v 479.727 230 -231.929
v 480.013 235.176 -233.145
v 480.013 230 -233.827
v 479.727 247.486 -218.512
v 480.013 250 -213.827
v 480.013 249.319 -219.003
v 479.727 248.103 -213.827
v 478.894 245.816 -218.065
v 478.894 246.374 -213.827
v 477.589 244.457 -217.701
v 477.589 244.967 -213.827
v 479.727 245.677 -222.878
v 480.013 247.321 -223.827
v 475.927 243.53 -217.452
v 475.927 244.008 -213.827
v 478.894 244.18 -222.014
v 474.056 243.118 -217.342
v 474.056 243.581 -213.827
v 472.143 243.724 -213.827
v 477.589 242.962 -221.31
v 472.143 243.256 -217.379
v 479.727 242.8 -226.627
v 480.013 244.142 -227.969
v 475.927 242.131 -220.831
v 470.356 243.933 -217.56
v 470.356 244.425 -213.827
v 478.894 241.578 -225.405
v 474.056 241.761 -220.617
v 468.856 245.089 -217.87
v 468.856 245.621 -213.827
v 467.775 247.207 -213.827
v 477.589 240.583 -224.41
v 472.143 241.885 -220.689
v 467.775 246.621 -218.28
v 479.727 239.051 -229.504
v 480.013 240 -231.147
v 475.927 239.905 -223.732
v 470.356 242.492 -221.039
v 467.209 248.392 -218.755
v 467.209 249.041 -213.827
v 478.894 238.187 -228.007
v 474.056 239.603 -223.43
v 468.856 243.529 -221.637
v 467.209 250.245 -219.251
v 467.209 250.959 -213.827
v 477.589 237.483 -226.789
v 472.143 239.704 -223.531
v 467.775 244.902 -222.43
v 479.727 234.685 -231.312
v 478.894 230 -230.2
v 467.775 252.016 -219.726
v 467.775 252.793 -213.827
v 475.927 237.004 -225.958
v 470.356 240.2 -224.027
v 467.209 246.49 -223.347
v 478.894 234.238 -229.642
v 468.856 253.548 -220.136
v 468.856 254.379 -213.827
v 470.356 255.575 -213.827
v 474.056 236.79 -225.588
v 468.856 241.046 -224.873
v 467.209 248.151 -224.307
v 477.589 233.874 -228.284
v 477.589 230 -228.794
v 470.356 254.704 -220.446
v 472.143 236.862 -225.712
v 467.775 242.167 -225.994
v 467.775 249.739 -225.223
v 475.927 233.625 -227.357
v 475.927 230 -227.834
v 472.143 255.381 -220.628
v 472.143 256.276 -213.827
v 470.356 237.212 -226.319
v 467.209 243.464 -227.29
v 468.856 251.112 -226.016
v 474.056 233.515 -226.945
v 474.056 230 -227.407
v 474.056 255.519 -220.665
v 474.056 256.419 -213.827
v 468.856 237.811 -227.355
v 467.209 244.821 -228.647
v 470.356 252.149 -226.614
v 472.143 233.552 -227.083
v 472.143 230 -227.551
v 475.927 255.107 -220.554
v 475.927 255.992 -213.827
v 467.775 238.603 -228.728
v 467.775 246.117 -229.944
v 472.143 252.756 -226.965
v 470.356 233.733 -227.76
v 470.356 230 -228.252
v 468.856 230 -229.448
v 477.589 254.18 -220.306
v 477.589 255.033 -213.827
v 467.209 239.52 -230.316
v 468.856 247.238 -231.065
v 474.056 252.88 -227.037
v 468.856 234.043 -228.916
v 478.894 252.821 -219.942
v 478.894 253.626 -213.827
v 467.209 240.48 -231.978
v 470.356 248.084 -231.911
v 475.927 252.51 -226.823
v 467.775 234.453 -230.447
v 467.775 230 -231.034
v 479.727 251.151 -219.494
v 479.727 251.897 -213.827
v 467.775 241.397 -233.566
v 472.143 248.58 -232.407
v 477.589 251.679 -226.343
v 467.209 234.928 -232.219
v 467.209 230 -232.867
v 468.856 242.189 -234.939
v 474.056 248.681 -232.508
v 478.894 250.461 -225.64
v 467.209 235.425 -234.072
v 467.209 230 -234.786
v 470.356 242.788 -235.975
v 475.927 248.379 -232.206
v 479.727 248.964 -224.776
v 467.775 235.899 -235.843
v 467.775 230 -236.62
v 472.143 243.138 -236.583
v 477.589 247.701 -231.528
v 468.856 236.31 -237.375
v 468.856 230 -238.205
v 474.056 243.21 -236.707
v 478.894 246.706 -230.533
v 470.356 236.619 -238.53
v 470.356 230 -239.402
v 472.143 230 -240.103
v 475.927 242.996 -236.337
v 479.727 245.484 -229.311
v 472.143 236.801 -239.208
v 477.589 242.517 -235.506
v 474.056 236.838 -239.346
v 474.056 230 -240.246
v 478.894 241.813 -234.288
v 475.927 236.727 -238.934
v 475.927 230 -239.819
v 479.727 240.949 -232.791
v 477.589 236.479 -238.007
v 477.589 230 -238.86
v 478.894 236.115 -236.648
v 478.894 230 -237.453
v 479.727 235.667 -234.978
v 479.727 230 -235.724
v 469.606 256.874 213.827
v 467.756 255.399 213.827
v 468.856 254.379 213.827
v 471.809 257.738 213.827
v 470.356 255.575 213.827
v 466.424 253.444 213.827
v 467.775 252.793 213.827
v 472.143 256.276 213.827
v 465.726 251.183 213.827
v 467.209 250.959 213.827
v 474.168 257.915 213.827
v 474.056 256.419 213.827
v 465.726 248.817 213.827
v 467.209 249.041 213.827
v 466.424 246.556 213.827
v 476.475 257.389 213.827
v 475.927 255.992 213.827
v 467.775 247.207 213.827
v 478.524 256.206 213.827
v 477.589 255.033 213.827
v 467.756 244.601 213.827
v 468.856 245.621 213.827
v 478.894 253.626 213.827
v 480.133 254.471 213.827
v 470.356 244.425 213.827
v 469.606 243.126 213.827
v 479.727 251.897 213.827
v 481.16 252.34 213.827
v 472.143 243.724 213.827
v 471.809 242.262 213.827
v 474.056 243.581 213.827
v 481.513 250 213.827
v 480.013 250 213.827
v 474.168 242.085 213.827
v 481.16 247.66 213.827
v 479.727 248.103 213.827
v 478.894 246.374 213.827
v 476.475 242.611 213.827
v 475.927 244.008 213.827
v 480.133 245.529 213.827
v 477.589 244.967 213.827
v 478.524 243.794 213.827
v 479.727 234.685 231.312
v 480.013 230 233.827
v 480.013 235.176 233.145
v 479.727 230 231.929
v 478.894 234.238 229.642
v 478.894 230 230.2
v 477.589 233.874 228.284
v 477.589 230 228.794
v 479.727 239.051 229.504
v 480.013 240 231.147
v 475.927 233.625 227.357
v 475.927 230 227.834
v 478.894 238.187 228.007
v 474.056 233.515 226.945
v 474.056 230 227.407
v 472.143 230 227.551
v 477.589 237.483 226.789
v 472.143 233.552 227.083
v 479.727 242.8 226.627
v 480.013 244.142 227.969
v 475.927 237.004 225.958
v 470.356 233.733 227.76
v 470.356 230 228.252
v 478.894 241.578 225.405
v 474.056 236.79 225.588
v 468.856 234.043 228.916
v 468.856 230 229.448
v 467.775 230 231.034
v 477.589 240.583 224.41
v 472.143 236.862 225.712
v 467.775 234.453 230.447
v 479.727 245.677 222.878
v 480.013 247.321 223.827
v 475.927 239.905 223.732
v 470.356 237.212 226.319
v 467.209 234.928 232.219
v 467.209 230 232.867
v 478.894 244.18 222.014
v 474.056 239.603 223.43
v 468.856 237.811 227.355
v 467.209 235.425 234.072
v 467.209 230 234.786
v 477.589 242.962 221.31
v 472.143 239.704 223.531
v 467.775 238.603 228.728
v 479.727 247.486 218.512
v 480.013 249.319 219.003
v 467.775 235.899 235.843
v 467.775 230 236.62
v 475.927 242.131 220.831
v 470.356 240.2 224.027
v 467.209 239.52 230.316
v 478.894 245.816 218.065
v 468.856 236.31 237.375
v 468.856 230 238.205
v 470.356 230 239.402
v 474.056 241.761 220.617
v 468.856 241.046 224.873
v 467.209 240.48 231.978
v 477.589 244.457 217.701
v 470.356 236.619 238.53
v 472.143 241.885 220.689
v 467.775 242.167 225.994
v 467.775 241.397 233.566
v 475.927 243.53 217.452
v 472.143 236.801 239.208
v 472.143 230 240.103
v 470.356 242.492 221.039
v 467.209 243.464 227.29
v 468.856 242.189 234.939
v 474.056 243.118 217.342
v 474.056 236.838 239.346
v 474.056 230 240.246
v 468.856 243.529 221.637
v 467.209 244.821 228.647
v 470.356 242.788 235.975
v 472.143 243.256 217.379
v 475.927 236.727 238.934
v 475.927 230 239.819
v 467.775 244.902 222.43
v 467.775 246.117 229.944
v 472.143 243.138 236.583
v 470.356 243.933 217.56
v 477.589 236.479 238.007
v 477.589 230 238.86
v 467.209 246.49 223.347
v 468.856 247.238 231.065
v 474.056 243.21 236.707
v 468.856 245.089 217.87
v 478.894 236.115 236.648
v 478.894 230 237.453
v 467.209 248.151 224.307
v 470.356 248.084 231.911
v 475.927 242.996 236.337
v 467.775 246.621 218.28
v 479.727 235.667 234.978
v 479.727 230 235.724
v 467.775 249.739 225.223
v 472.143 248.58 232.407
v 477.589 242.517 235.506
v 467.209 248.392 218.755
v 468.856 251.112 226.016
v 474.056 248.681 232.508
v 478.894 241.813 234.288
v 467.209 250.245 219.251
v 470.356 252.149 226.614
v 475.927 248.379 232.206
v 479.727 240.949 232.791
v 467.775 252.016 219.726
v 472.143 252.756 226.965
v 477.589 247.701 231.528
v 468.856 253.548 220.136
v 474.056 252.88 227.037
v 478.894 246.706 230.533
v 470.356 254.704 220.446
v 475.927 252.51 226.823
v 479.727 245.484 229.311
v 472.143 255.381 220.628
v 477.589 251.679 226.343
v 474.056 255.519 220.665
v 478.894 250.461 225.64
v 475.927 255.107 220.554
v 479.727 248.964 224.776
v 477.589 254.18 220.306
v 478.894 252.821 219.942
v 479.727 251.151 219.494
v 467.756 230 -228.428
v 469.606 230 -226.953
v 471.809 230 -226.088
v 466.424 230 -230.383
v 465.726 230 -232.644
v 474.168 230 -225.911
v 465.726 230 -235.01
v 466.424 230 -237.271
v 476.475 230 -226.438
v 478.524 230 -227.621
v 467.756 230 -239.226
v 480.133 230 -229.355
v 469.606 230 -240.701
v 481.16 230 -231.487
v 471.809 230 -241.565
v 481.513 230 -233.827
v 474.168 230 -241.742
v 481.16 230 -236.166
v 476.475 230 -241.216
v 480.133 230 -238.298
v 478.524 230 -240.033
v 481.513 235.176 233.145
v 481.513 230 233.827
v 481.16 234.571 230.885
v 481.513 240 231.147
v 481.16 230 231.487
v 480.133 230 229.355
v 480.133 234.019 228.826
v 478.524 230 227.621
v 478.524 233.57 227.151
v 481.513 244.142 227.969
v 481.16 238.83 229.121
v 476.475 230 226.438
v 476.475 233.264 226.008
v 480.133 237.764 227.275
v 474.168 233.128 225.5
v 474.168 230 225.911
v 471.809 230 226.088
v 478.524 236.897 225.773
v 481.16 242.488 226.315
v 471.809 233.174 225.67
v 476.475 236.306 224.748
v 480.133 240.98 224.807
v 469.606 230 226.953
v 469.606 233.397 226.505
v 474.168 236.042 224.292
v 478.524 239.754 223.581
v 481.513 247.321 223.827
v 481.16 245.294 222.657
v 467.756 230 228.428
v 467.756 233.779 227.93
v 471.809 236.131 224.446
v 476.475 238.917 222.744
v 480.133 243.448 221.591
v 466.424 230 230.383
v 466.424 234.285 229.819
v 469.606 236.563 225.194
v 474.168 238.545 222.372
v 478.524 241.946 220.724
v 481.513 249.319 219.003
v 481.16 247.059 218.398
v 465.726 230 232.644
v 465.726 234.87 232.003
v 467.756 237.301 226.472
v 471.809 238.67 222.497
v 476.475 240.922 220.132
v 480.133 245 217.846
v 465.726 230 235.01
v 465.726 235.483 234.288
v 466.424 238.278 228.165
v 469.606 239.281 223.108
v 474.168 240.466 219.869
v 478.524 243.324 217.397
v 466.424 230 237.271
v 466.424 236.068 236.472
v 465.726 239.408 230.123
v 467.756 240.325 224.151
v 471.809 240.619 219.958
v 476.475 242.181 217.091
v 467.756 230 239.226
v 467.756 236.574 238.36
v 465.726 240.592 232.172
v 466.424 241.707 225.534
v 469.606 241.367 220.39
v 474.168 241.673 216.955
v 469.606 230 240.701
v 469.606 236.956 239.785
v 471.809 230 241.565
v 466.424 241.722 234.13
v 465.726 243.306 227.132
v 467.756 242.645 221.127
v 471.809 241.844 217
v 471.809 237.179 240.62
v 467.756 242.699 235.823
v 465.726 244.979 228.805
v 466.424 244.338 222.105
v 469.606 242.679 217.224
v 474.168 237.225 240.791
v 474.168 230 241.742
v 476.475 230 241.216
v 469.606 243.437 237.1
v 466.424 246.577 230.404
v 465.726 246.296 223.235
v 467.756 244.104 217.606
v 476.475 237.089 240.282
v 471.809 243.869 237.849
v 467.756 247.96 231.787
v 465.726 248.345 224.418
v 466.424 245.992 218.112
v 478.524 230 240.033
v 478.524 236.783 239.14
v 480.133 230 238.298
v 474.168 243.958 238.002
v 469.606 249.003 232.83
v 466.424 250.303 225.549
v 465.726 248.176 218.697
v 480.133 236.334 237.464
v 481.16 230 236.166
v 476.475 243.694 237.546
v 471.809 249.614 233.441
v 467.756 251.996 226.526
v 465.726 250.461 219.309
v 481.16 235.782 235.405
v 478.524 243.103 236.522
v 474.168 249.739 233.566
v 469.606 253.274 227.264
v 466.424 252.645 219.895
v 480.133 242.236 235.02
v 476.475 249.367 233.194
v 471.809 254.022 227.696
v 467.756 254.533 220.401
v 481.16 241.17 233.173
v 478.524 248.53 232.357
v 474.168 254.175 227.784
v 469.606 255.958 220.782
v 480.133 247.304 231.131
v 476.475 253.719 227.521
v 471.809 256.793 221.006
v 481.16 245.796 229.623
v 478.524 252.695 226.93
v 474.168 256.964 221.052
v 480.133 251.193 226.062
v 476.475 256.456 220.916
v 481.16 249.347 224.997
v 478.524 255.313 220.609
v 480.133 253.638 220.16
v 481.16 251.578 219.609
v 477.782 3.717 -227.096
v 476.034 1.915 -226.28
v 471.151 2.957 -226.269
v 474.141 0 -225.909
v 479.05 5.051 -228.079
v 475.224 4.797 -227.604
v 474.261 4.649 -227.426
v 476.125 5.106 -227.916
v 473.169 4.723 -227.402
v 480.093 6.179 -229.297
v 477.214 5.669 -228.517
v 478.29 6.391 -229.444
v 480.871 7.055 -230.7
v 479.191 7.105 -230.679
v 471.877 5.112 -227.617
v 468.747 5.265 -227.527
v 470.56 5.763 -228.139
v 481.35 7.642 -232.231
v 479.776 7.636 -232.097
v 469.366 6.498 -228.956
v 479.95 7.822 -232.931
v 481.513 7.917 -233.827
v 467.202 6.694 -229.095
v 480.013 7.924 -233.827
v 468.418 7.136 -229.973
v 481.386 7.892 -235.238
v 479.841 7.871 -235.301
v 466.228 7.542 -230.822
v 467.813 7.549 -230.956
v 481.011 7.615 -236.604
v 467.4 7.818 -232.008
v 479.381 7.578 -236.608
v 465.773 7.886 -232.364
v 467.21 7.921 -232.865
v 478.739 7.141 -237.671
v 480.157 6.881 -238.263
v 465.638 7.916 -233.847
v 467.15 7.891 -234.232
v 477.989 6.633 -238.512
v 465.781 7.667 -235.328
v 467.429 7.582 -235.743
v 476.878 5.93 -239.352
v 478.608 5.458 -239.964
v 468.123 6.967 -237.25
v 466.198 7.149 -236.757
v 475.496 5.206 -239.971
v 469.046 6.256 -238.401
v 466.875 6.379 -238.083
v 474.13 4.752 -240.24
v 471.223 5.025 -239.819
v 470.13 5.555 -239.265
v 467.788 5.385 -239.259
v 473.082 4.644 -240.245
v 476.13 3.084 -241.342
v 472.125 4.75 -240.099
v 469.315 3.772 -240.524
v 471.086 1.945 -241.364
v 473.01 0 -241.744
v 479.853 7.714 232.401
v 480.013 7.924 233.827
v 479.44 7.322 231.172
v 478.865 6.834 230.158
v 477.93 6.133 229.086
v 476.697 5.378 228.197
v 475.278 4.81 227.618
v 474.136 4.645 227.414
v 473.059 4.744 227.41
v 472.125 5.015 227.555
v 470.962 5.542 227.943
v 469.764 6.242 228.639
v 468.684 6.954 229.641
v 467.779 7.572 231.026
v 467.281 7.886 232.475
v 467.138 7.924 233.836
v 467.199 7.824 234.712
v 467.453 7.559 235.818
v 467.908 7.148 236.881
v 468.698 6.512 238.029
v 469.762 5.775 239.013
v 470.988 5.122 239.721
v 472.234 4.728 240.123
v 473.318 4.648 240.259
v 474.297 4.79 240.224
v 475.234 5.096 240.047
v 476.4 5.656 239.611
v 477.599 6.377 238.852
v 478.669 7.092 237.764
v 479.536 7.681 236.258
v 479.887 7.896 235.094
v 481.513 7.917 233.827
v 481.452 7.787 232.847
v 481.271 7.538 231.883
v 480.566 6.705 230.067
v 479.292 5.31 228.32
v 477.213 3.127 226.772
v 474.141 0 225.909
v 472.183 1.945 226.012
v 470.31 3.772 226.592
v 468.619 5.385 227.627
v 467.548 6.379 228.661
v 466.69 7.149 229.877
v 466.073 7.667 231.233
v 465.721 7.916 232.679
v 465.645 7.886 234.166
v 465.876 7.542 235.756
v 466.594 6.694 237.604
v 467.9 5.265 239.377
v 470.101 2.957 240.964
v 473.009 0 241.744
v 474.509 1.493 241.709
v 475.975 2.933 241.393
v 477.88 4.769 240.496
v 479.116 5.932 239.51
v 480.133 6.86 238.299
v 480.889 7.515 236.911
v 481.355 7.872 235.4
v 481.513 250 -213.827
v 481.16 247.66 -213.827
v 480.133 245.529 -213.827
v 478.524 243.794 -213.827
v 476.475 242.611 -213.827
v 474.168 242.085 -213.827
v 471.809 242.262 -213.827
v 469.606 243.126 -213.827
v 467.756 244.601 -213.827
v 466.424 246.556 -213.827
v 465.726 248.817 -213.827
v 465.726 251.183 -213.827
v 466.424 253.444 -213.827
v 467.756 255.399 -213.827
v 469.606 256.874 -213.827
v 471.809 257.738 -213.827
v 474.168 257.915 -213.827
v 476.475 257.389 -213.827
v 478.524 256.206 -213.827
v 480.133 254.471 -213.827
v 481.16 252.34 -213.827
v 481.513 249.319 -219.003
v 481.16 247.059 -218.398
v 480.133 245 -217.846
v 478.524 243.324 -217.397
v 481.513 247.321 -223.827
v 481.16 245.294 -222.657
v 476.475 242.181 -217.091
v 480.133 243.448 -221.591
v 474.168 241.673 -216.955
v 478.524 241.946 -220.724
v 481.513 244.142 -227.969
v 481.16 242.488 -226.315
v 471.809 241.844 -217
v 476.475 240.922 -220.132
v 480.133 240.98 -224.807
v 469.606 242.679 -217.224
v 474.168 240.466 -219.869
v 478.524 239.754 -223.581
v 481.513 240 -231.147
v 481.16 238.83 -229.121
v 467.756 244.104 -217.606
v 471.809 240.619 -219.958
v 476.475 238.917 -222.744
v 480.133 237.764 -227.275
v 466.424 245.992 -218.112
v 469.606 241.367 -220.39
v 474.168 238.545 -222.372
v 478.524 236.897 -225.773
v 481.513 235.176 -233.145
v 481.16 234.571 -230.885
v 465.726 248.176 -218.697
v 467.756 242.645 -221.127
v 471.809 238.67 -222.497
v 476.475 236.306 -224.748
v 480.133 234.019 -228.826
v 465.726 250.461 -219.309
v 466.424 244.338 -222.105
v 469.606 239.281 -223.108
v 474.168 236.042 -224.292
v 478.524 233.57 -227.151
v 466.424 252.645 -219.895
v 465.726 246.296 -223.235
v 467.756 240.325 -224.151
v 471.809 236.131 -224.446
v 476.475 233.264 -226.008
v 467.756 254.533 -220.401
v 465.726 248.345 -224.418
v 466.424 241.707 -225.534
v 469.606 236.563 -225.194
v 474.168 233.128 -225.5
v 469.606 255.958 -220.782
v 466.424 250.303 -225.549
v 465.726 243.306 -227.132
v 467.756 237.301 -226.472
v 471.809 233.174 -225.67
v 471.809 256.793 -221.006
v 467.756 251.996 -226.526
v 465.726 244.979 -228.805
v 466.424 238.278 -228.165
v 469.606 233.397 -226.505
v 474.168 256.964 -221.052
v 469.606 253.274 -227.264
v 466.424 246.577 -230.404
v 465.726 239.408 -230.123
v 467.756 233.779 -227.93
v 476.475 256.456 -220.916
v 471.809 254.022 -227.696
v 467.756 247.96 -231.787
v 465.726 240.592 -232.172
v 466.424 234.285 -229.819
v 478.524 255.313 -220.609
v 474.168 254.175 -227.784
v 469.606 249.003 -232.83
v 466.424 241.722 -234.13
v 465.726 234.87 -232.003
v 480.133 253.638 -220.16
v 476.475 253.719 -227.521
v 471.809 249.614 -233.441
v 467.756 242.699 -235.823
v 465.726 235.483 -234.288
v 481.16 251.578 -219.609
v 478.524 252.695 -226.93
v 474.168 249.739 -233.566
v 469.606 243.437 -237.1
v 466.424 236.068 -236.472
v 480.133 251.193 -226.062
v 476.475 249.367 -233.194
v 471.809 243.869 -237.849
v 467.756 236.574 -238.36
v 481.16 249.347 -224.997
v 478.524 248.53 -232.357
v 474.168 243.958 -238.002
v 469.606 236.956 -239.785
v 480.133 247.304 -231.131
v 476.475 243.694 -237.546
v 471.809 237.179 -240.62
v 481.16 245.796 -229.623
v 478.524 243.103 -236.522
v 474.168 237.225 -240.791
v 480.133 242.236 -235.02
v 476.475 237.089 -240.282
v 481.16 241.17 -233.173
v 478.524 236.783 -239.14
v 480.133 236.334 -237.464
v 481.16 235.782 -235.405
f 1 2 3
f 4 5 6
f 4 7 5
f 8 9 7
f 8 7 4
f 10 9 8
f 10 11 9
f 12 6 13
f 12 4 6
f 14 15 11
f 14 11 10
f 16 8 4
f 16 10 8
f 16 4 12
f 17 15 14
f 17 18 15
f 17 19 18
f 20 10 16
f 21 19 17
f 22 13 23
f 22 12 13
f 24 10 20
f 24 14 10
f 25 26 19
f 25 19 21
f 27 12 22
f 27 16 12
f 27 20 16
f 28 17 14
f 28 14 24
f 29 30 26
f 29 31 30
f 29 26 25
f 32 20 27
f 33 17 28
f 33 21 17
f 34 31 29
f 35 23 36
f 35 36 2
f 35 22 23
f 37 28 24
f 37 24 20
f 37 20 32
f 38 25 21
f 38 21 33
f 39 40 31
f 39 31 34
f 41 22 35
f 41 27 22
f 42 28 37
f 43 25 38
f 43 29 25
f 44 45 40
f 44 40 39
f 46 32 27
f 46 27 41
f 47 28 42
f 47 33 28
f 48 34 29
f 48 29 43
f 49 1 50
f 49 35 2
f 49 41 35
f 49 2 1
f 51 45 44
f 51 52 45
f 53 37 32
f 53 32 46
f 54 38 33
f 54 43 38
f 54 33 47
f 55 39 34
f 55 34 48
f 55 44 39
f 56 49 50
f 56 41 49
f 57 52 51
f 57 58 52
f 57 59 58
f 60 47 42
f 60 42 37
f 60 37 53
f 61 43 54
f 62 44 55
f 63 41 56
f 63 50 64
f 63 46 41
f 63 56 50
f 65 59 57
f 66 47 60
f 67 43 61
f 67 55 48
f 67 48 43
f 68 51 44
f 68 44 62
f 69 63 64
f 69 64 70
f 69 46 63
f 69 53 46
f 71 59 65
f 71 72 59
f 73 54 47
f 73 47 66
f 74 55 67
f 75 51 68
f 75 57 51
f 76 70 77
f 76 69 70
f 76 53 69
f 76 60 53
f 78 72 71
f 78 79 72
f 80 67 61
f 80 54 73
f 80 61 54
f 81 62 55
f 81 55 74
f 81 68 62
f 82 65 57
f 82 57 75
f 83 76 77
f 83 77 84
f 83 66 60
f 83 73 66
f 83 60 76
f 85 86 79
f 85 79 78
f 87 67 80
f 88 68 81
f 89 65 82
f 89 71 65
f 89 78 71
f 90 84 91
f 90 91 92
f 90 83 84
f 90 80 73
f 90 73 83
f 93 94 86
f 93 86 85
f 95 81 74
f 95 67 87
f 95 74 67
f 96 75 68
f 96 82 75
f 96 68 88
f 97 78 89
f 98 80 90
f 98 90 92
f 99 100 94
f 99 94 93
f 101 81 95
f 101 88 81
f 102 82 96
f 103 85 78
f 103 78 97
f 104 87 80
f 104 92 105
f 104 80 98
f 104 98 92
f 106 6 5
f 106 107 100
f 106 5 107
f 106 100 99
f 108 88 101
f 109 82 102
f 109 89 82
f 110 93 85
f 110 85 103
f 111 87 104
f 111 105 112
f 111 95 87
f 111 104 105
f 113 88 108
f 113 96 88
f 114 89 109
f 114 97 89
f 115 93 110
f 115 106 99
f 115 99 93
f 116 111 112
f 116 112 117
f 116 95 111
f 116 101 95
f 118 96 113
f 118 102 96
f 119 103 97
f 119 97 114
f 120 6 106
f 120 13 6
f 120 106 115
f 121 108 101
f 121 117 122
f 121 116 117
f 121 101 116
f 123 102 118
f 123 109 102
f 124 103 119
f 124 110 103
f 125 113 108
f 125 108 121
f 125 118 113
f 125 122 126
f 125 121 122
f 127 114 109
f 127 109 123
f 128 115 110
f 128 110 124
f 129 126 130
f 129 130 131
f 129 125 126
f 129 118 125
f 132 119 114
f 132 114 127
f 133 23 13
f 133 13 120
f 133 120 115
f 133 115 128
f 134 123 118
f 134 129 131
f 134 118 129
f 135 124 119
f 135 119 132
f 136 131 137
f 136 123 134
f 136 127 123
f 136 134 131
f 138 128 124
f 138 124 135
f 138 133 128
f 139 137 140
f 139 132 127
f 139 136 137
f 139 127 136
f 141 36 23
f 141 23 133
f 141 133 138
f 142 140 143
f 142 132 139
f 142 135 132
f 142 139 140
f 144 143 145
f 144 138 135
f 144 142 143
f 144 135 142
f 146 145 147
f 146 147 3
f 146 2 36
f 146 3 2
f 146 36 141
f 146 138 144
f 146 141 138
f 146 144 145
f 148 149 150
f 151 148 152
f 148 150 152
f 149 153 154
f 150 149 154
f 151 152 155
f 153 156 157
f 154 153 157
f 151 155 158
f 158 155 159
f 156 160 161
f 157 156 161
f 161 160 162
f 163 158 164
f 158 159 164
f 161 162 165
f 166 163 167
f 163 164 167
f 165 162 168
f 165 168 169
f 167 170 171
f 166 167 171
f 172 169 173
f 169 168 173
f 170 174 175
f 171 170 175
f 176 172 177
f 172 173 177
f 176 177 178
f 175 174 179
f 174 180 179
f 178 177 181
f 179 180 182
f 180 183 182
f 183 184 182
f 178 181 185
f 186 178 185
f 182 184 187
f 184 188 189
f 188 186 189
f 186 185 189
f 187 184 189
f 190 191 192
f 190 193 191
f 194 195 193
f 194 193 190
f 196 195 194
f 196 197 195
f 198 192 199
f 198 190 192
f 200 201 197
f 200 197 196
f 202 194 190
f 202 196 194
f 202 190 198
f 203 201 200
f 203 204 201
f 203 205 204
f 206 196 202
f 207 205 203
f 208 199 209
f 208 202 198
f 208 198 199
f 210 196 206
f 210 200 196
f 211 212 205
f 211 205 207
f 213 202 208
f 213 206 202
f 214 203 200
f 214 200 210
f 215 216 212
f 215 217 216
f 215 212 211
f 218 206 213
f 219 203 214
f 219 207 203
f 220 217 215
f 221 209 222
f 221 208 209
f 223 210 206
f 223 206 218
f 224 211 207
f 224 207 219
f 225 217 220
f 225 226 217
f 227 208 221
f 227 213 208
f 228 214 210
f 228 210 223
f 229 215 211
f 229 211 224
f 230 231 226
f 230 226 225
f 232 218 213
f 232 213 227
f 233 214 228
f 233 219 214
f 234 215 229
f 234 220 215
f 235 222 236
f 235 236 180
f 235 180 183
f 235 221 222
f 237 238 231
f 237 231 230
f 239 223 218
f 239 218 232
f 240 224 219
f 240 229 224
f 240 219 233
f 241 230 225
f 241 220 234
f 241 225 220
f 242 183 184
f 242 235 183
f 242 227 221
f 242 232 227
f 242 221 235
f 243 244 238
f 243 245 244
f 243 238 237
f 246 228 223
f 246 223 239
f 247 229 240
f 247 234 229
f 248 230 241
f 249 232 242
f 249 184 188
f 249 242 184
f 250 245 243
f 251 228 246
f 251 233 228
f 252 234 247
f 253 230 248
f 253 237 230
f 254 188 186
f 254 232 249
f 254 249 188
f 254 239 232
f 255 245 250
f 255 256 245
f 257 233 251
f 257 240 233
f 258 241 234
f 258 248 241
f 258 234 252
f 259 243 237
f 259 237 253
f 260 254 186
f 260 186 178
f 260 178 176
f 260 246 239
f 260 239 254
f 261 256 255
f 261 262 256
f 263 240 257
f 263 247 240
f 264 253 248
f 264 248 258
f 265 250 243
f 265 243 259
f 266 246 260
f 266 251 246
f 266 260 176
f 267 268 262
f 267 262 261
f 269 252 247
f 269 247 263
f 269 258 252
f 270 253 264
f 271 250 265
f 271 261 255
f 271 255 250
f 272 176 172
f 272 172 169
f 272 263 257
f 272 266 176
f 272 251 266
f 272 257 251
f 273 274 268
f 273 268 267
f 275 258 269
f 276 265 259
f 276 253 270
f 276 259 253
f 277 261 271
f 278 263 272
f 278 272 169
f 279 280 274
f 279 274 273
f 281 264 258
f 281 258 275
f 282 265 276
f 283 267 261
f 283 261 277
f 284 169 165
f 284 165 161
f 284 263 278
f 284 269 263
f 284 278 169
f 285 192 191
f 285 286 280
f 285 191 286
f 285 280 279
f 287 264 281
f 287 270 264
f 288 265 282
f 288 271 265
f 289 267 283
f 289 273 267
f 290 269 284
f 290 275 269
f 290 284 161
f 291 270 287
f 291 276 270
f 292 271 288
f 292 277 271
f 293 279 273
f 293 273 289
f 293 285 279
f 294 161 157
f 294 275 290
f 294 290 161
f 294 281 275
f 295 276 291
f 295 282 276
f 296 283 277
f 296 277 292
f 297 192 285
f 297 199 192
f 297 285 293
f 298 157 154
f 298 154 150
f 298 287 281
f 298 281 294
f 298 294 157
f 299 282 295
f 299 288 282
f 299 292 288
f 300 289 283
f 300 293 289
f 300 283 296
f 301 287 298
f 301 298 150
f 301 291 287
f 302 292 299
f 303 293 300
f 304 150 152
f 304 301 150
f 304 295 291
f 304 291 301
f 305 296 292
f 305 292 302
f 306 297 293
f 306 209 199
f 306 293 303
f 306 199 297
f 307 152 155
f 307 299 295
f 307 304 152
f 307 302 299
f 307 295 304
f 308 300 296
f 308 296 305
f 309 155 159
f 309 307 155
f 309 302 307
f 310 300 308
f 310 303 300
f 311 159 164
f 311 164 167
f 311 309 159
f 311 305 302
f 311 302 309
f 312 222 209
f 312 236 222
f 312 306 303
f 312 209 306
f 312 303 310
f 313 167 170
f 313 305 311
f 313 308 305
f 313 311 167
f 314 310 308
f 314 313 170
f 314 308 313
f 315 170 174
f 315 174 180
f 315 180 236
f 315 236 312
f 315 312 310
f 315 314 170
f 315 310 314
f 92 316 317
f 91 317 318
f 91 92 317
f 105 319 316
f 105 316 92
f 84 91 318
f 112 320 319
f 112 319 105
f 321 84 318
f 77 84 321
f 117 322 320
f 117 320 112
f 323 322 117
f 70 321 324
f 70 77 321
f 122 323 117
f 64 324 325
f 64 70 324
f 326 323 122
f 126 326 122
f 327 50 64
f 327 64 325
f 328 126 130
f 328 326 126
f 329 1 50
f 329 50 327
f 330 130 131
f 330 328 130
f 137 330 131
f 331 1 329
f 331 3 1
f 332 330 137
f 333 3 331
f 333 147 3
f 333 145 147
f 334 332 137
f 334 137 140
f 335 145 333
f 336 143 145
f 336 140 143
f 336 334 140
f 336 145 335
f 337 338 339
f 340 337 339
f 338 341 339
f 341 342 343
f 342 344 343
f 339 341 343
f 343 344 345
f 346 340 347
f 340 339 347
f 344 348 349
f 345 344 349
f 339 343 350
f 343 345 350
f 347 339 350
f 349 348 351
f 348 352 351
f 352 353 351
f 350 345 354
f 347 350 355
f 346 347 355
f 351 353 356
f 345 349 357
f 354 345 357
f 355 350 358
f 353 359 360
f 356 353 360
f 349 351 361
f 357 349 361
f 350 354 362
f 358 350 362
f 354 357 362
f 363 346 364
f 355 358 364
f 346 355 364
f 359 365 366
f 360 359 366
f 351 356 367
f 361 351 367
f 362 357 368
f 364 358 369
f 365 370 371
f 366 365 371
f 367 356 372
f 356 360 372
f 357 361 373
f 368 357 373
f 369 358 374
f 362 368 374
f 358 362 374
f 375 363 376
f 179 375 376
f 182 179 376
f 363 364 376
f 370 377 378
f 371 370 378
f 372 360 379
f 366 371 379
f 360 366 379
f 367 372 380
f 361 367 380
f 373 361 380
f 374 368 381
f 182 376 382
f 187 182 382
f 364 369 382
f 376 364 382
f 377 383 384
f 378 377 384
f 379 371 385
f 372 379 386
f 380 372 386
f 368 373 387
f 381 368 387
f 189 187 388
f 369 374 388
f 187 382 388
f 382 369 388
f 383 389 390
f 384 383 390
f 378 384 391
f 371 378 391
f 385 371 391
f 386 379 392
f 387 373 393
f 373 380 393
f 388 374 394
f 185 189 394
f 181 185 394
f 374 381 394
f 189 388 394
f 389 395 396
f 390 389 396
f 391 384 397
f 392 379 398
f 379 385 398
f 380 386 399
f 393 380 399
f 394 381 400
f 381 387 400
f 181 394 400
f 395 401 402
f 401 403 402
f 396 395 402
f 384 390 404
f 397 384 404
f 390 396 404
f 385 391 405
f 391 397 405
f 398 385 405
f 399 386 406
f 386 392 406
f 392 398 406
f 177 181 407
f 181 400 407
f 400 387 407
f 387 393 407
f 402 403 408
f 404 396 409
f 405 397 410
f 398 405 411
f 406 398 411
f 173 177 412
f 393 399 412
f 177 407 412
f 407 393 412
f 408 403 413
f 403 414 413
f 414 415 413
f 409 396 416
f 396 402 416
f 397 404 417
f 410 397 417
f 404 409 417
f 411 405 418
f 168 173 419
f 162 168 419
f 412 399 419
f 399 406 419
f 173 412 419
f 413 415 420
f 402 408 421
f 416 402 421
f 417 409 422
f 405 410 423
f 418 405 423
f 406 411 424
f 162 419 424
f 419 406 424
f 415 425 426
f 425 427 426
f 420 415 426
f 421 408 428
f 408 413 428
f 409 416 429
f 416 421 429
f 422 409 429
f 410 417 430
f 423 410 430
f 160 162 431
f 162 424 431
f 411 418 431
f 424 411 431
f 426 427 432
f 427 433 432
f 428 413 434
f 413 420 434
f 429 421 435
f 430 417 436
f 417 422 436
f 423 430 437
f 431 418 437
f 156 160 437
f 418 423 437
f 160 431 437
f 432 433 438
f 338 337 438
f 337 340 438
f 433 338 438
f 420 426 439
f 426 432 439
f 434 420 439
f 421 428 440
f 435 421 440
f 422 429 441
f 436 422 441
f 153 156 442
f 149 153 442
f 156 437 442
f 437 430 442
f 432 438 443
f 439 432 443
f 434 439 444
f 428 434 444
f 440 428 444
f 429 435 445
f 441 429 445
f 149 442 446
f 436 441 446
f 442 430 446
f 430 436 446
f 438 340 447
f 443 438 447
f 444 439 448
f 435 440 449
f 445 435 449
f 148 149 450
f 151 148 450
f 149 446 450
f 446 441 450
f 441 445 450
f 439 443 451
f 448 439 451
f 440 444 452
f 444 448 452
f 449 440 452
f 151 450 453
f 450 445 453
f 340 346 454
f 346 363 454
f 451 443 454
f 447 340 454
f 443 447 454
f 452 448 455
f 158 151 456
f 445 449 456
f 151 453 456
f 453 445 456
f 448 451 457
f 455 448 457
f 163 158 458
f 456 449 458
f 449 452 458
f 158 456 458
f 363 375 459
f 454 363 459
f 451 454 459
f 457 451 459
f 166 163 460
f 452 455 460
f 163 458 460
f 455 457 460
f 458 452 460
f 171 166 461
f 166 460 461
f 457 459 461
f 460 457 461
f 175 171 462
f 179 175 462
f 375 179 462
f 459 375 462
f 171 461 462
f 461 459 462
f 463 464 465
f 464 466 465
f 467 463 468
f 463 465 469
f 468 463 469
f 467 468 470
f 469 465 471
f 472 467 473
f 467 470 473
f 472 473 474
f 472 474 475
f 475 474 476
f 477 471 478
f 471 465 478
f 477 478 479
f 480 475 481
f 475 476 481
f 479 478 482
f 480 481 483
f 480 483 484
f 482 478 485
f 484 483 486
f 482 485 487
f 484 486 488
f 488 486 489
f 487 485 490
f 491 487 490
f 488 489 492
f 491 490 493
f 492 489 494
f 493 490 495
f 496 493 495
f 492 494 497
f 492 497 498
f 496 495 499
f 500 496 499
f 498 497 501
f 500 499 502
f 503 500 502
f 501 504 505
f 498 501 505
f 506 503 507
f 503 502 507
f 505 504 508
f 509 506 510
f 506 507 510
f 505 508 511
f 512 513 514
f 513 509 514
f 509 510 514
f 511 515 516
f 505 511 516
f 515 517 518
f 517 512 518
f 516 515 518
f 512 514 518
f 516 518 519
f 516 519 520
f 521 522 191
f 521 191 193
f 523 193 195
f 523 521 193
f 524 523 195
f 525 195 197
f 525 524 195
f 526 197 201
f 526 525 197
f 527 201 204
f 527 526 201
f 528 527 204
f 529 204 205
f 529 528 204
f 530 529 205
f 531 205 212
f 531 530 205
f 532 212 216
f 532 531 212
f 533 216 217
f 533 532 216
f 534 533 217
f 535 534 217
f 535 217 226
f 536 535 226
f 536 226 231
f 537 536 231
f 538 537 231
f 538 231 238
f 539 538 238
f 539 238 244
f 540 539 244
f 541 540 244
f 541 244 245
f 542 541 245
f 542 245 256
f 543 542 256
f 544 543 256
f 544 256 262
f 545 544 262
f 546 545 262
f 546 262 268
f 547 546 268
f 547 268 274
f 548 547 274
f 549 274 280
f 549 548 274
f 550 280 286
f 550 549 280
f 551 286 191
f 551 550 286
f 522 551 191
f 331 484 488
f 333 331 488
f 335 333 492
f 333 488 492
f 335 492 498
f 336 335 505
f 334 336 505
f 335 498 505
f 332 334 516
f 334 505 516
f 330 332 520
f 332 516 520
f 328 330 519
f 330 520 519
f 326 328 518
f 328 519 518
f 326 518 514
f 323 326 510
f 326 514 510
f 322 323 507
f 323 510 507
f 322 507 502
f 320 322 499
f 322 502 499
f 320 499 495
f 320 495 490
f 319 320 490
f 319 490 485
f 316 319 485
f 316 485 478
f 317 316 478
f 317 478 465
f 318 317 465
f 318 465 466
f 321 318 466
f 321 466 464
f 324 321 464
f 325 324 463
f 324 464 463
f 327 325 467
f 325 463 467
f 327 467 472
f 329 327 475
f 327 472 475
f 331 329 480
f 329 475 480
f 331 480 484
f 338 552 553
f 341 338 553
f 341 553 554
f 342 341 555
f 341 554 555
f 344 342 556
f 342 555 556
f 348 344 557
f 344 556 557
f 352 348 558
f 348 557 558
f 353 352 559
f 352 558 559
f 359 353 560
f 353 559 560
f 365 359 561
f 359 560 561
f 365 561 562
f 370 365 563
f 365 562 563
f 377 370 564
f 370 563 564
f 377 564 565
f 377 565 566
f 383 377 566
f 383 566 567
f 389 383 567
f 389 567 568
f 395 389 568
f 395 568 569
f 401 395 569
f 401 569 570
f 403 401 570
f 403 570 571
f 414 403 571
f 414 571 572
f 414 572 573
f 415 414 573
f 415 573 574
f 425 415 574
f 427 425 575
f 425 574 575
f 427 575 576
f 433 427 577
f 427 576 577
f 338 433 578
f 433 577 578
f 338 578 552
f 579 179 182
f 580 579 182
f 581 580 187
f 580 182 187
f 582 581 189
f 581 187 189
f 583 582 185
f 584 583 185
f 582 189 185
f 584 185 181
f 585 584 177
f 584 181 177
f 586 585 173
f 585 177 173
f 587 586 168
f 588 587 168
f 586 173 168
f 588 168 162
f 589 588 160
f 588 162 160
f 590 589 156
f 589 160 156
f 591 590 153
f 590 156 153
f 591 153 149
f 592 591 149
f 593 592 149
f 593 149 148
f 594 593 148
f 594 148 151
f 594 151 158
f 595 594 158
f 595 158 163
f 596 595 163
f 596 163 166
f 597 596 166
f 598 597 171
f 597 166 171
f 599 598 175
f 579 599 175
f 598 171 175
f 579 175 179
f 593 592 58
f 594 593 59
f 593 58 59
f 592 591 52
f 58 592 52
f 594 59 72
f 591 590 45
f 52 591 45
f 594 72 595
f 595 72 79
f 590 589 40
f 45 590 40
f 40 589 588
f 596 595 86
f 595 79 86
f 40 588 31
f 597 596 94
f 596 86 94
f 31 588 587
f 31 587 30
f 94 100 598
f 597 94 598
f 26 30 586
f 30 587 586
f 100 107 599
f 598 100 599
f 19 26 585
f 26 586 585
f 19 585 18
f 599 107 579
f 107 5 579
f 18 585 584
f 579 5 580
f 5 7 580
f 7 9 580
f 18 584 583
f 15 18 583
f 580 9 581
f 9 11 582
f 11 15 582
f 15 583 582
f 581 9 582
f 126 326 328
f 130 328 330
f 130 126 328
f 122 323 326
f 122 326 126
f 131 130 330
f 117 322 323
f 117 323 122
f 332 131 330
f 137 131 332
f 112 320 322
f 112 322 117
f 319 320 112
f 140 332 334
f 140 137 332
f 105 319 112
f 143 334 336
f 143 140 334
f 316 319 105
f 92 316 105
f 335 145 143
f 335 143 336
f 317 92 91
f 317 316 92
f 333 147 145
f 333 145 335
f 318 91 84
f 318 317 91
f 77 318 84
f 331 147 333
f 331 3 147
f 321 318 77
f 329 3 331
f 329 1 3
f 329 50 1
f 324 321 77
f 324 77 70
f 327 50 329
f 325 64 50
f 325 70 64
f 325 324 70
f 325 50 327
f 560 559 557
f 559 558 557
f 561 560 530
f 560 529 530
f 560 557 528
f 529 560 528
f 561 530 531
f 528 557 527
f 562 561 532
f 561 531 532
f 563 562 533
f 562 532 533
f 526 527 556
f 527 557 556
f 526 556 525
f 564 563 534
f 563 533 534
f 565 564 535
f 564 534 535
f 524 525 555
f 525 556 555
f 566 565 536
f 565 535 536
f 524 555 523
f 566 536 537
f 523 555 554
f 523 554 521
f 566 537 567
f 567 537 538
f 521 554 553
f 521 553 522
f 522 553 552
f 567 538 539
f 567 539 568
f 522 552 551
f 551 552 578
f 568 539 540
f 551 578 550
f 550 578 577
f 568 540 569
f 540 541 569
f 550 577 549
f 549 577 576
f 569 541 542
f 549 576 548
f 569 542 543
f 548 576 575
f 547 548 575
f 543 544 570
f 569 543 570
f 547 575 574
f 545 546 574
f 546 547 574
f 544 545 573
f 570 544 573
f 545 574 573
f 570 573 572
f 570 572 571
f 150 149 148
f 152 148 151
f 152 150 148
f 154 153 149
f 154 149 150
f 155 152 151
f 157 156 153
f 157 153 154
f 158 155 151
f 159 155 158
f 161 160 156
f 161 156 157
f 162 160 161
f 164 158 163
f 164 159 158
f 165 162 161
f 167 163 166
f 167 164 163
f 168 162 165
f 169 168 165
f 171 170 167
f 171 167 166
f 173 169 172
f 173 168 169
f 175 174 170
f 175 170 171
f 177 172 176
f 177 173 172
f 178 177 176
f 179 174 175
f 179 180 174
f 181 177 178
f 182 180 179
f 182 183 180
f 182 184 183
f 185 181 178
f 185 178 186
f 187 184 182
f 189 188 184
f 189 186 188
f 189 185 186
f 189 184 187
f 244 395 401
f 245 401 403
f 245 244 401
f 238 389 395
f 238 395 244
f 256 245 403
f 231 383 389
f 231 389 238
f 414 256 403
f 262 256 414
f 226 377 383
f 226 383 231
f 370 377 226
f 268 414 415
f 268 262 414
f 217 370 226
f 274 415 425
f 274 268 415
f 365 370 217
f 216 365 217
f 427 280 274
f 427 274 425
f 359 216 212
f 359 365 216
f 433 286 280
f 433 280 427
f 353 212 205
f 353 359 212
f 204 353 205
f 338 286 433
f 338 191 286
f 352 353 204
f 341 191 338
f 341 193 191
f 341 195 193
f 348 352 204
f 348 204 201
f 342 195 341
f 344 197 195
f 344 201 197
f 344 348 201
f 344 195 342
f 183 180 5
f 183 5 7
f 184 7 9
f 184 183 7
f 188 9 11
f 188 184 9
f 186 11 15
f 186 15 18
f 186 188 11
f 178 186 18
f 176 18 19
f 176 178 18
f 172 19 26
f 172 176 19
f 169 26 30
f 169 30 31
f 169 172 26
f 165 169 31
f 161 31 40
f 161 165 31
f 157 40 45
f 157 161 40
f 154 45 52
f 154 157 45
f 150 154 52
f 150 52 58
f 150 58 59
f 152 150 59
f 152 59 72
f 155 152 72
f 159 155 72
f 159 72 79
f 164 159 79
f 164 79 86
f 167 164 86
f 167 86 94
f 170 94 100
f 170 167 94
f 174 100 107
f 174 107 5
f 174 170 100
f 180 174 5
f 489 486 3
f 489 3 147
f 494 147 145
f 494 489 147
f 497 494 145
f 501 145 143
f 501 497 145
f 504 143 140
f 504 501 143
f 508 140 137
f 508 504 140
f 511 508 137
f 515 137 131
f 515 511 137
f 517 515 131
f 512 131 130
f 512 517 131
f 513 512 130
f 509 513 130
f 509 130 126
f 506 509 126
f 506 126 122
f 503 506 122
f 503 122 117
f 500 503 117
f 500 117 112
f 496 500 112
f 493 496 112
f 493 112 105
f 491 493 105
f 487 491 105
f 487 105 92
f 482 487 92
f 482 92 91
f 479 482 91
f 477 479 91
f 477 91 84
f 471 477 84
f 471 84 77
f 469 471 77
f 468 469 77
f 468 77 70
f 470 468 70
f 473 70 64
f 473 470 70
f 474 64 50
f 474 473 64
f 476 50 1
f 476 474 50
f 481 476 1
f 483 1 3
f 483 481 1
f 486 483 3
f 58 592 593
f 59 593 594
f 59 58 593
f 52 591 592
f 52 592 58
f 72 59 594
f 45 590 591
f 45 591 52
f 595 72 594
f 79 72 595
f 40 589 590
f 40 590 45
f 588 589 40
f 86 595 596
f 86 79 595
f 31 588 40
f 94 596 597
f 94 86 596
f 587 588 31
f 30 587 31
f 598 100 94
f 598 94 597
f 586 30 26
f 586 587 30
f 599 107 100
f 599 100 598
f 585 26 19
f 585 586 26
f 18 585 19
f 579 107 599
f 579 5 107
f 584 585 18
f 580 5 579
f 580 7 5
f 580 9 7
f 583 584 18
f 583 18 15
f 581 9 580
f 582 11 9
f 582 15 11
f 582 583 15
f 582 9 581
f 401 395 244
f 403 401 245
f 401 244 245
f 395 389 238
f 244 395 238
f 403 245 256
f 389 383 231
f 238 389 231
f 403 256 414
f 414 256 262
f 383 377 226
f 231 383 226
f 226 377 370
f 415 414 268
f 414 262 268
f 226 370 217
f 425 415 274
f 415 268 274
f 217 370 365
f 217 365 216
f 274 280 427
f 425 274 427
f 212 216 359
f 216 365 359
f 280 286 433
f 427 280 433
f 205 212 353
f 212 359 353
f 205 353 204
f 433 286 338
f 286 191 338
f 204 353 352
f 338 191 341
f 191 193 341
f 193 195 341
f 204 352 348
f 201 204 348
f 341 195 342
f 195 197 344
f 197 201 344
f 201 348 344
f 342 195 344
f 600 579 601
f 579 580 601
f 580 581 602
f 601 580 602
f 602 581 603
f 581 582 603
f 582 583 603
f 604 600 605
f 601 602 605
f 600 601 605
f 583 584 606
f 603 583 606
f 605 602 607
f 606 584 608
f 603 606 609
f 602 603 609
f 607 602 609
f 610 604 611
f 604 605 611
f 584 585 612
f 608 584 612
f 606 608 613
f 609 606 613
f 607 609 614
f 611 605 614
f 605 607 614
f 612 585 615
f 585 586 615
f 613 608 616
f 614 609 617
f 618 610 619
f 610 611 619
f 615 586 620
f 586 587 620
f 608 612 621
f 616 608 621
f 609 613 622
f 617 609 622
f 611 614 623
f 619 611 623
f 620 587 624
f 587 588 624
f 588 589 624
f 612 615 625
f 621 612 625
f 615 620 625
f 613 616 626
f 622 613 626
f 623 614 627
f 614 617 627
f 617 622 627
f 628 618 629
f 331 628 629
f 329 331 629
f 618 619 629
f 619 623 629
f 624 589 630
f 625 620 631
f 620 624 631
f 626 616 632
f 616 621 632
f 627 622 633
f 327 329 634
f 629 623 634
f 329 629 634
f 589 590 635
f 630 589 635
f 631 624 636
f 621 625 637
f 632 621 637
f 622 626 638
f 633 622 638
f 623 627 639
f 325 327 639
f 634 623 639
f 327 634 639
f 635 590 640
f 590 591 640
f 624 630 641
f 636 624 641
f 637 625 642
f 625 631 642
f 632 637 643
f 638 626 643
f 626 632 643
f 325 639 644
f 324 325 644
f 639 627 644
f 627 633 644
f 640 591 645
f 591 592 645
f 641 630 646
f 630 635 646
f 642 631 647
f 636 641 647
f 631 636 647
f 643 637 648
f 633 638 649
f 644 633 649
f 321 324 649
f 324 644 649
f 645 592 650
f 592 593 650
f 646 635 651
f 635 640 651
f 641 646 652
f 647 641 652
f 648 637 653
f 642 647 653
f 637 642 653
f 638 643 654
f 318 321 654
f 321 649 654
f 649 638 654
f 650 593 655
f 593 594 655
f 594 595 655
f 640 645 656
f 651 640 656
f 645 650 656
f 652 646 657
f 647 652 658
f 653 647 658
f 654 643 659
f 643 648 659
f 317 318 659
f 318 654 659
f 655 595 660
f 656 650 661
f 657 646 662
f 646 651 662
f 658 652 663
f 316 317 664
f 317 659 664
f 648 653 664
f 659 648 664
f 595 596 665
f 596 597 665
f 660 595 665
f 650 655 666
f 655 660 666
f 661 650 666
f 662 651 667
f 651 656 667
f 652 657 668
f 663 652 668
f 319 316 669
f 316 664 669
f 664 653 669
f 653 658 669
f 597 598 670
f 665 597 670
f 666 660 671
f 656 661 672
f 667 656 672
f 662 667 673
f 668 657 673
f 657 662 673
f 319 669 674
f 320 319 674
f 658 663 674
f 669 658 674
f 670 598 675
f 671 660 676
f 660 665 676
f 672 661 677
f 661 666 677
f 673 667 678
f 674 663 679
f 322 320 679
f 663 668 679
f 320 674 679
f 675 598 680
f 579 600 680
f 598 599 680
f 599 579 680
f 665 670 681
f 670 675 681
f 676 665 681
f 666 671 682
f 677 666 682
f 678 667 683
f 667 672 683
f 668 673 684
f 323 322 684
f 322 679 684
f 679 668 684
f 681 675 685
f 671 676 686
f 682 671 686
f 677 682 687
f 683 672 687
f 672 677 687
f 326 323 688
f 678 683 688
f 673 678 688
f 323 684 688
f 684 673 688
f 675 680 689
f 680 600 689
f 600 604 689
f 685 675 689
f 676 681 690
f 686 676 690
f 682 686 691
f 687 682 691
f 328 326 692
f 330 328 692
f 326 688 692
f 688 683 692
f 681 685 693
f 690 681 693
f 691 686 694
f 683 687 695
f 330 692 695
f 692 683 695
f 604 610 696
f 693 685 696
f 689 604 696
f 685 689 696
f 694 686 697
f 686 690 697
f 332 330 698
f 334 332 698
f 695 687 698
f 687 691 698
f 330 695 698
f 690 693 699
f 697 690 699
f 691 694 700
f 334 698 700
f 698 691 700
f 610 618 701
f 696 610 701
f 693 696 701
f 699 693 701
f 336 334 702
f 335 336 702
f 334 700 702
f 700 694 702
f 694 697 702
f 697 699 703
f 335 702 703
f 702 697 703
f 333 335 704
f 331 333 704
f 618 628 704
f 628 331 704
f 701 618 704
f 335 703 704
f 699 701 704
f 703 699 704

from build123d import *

# Parameters (mm, degrees)
SKETCH1_R                            = 7.9375
SKETCH1_R_2                          = 6.4375
PIPE_CONFIGURED_21_3_X_2_3_1_DEPTH   = 230
SKETCH1_ON_SEGMENT_2_R               = 7.9375
SKETCH1_ON_SEGMENT_2_R_2             = 6.4375
PIPE_CONFIGURED_21_3_X_2_3_1_2_ANGLE = 90
SKETCH1_ON_SEGMENT_3_R               = 7.9375
SKETCH1_ON_SEGMENT_3_R_2             = 6.4375
PIPE_CONFIGURED_21_3_X_2_3_1_3_DEPTH = 427.653579857
SKETCH1_ON_SEGMENT_4_R               = 7.9375
SKETCH1_ON_SEGMENT_4_R_2             = 6.4375
PIPE_CONFIGURED_21_3_X_2_3_1_4_ANGLE = 90
SKETCH1_ON_SEGMENT_5_R               = 7.9375
SKETCH1_ON_SEGMENT_5_R_2             = 6.4375
PIPE_CONFIGURED_21_3_X_2_3_1_5_DEPTH = 230
ESBO_O6_R                            = 7.9375


with BuildPart() as part:
    # Sketch1 → Pipe - configured 21.3 X 2.3(1) (new body)
    with BuildSketch(Plane(origin=(473.575059, 0, 233.826789929), x_dir=(1, 0, 0), z_dir=(0, 1, 0))):
        Circle(SKETCH1_R)
        Circle(SKETCH1_R_2, mode=Mode.SUBTRACT)
    extrude(amount=PIPE_CONFIGURED_21_3_X_2_3_1_DEPTH)


with BuildPart() as body_2:
    # Sketch1 on segment 2 (carried to the start of arc 2) → Pipe - configured 21.3 X 2.3_1 2 (revolve)
    with BuildSketch(Plane(origin=(473.575059, 230, 233.826789929), x_dir=(1, 0, 0), z_dir=(0, 1, 0))):
        Circle(SKETCH1_ON_SEGMENT_2_R)
        Circle(SKETCH1_ON_SEGMENT_2_R_2, mode=Mode.SUBTRACT)
    revolve(axis=Axis((473.575059, 230, 213.826789929), (-1, 0, 0)), revolution_arc=PIPE_CONFIGURED_21_3_X_2_3_1_2_ANGLE)


with BuildPart() as body_3:
    # Sketch1 on segment 3 (carried to segment 3) → Pipe - configured 21.3 X 2.3_1 3 (new body)
    with BuildSketch(Plane(origin=(473.575059, 250, 213.826789929), x_dir=(1, 0, 0), z_dir=(0, 0, -1))):
        Circle(SKETCH1_ON_SEGMENT_3_R)
        Circle(SKETCH1_ON_SEGMENT_3_R_2, mode=Mode.SUBTRACT)
    extrude(amount=PIPE_CONFIGURED_21_3_X_2_3_1_3_DEPTH)


with BuildPart() as body_4:
    # Sketch1 on segment 4 (carried to the start of arc 4) → Pipe - configured 21.3 X 2.3_1 4 (revolve)
    with BuildSketch(Plane(origin=(473.575059, 250, -213.826789929), x_dir=(1, 0, 0), z_dir=(0, 0, -1))):
        Circle(SKETCH1_ON_SEGMENT_4_R)
        Circle(SKETCH1_ON_SEGMENT_4_R_2, mode=Mode.SUBTRACT)
    revolve(axis=Axis((473.575059, 230, -213.826789929), (-1, 0, 0)), revolution_arc=PIPE_CONFIGURED_21_3_X_2_3_1_4_ANGLE)


with BuildPart() as body_5:
    # Sketch1 on segment 5 (carried to segment 5) → Pipe - configured 21.3 X 2.3_1 5 (new body)
    with BuildSketch(Plane(origin=(473.575059, 0, -233.826789929), x_dir=(1, 0, 0), z_dir=(0, 1, 0))):
        Circle(SKETCH1_ON_SEGMENT_5_R)
        Circle(SKETCH1_ON_SEGMENT_5_R_2, mode=Mode.SUBTRACT)
    extrude(amount=PIPE_CONFIGURED_21_3_X_2_3_1_5_DEPTH)


with BuildPart() as varredura_de_corte1_tool:
    # Varredura de corte1: sweep along a path in Esboço1
    with BuildLine(Plane(origin=(0, 0, 0), x_dir=(1, 0, 0), z_dir=(0, 1, 0))) as varredura_de_corte1_path:
        Line((910, 265), (37.150118, 202.653579857))
        ThreePointArc((37.150118, 202.653579857), (10.725477972, 190.013301495), (0, 162.755231864))
        Line((0, 162.755231864), (0, -162.755231864))
        ThreePointArc((0, -162.755231864), (10.725477972, -190.013301495), (37.150118, -202.653579857))
        Line((37.150118, -202.653579857), (910, -265))
    # Esboço6 → Varredura de corte1 (sweep)
    with BuildSketch(Plane.XY):
        Circle(ESBO_O6_R)
    sweep(path=varredura_de_corte1_path.line)


with BuildPart() as part_1:
    add(part.part)

    # Varredura de corte1: cut by varredura_de_corte1_tool
    add(varredura_de_corte1_tool.part, mode=Mode.SUBTRACT)


with BuildPart() as body_5_1:
    add(body_5.part)

    # Varredura de corte1: cut by varredura_de_corte1_tool
    add(varredura_de_corte1_tool.part, mode=Mode.SUBTRACT)


solid = Compound([body_2.part, body_3.part, body_4.part, part_1.part, body_5_1.part])
